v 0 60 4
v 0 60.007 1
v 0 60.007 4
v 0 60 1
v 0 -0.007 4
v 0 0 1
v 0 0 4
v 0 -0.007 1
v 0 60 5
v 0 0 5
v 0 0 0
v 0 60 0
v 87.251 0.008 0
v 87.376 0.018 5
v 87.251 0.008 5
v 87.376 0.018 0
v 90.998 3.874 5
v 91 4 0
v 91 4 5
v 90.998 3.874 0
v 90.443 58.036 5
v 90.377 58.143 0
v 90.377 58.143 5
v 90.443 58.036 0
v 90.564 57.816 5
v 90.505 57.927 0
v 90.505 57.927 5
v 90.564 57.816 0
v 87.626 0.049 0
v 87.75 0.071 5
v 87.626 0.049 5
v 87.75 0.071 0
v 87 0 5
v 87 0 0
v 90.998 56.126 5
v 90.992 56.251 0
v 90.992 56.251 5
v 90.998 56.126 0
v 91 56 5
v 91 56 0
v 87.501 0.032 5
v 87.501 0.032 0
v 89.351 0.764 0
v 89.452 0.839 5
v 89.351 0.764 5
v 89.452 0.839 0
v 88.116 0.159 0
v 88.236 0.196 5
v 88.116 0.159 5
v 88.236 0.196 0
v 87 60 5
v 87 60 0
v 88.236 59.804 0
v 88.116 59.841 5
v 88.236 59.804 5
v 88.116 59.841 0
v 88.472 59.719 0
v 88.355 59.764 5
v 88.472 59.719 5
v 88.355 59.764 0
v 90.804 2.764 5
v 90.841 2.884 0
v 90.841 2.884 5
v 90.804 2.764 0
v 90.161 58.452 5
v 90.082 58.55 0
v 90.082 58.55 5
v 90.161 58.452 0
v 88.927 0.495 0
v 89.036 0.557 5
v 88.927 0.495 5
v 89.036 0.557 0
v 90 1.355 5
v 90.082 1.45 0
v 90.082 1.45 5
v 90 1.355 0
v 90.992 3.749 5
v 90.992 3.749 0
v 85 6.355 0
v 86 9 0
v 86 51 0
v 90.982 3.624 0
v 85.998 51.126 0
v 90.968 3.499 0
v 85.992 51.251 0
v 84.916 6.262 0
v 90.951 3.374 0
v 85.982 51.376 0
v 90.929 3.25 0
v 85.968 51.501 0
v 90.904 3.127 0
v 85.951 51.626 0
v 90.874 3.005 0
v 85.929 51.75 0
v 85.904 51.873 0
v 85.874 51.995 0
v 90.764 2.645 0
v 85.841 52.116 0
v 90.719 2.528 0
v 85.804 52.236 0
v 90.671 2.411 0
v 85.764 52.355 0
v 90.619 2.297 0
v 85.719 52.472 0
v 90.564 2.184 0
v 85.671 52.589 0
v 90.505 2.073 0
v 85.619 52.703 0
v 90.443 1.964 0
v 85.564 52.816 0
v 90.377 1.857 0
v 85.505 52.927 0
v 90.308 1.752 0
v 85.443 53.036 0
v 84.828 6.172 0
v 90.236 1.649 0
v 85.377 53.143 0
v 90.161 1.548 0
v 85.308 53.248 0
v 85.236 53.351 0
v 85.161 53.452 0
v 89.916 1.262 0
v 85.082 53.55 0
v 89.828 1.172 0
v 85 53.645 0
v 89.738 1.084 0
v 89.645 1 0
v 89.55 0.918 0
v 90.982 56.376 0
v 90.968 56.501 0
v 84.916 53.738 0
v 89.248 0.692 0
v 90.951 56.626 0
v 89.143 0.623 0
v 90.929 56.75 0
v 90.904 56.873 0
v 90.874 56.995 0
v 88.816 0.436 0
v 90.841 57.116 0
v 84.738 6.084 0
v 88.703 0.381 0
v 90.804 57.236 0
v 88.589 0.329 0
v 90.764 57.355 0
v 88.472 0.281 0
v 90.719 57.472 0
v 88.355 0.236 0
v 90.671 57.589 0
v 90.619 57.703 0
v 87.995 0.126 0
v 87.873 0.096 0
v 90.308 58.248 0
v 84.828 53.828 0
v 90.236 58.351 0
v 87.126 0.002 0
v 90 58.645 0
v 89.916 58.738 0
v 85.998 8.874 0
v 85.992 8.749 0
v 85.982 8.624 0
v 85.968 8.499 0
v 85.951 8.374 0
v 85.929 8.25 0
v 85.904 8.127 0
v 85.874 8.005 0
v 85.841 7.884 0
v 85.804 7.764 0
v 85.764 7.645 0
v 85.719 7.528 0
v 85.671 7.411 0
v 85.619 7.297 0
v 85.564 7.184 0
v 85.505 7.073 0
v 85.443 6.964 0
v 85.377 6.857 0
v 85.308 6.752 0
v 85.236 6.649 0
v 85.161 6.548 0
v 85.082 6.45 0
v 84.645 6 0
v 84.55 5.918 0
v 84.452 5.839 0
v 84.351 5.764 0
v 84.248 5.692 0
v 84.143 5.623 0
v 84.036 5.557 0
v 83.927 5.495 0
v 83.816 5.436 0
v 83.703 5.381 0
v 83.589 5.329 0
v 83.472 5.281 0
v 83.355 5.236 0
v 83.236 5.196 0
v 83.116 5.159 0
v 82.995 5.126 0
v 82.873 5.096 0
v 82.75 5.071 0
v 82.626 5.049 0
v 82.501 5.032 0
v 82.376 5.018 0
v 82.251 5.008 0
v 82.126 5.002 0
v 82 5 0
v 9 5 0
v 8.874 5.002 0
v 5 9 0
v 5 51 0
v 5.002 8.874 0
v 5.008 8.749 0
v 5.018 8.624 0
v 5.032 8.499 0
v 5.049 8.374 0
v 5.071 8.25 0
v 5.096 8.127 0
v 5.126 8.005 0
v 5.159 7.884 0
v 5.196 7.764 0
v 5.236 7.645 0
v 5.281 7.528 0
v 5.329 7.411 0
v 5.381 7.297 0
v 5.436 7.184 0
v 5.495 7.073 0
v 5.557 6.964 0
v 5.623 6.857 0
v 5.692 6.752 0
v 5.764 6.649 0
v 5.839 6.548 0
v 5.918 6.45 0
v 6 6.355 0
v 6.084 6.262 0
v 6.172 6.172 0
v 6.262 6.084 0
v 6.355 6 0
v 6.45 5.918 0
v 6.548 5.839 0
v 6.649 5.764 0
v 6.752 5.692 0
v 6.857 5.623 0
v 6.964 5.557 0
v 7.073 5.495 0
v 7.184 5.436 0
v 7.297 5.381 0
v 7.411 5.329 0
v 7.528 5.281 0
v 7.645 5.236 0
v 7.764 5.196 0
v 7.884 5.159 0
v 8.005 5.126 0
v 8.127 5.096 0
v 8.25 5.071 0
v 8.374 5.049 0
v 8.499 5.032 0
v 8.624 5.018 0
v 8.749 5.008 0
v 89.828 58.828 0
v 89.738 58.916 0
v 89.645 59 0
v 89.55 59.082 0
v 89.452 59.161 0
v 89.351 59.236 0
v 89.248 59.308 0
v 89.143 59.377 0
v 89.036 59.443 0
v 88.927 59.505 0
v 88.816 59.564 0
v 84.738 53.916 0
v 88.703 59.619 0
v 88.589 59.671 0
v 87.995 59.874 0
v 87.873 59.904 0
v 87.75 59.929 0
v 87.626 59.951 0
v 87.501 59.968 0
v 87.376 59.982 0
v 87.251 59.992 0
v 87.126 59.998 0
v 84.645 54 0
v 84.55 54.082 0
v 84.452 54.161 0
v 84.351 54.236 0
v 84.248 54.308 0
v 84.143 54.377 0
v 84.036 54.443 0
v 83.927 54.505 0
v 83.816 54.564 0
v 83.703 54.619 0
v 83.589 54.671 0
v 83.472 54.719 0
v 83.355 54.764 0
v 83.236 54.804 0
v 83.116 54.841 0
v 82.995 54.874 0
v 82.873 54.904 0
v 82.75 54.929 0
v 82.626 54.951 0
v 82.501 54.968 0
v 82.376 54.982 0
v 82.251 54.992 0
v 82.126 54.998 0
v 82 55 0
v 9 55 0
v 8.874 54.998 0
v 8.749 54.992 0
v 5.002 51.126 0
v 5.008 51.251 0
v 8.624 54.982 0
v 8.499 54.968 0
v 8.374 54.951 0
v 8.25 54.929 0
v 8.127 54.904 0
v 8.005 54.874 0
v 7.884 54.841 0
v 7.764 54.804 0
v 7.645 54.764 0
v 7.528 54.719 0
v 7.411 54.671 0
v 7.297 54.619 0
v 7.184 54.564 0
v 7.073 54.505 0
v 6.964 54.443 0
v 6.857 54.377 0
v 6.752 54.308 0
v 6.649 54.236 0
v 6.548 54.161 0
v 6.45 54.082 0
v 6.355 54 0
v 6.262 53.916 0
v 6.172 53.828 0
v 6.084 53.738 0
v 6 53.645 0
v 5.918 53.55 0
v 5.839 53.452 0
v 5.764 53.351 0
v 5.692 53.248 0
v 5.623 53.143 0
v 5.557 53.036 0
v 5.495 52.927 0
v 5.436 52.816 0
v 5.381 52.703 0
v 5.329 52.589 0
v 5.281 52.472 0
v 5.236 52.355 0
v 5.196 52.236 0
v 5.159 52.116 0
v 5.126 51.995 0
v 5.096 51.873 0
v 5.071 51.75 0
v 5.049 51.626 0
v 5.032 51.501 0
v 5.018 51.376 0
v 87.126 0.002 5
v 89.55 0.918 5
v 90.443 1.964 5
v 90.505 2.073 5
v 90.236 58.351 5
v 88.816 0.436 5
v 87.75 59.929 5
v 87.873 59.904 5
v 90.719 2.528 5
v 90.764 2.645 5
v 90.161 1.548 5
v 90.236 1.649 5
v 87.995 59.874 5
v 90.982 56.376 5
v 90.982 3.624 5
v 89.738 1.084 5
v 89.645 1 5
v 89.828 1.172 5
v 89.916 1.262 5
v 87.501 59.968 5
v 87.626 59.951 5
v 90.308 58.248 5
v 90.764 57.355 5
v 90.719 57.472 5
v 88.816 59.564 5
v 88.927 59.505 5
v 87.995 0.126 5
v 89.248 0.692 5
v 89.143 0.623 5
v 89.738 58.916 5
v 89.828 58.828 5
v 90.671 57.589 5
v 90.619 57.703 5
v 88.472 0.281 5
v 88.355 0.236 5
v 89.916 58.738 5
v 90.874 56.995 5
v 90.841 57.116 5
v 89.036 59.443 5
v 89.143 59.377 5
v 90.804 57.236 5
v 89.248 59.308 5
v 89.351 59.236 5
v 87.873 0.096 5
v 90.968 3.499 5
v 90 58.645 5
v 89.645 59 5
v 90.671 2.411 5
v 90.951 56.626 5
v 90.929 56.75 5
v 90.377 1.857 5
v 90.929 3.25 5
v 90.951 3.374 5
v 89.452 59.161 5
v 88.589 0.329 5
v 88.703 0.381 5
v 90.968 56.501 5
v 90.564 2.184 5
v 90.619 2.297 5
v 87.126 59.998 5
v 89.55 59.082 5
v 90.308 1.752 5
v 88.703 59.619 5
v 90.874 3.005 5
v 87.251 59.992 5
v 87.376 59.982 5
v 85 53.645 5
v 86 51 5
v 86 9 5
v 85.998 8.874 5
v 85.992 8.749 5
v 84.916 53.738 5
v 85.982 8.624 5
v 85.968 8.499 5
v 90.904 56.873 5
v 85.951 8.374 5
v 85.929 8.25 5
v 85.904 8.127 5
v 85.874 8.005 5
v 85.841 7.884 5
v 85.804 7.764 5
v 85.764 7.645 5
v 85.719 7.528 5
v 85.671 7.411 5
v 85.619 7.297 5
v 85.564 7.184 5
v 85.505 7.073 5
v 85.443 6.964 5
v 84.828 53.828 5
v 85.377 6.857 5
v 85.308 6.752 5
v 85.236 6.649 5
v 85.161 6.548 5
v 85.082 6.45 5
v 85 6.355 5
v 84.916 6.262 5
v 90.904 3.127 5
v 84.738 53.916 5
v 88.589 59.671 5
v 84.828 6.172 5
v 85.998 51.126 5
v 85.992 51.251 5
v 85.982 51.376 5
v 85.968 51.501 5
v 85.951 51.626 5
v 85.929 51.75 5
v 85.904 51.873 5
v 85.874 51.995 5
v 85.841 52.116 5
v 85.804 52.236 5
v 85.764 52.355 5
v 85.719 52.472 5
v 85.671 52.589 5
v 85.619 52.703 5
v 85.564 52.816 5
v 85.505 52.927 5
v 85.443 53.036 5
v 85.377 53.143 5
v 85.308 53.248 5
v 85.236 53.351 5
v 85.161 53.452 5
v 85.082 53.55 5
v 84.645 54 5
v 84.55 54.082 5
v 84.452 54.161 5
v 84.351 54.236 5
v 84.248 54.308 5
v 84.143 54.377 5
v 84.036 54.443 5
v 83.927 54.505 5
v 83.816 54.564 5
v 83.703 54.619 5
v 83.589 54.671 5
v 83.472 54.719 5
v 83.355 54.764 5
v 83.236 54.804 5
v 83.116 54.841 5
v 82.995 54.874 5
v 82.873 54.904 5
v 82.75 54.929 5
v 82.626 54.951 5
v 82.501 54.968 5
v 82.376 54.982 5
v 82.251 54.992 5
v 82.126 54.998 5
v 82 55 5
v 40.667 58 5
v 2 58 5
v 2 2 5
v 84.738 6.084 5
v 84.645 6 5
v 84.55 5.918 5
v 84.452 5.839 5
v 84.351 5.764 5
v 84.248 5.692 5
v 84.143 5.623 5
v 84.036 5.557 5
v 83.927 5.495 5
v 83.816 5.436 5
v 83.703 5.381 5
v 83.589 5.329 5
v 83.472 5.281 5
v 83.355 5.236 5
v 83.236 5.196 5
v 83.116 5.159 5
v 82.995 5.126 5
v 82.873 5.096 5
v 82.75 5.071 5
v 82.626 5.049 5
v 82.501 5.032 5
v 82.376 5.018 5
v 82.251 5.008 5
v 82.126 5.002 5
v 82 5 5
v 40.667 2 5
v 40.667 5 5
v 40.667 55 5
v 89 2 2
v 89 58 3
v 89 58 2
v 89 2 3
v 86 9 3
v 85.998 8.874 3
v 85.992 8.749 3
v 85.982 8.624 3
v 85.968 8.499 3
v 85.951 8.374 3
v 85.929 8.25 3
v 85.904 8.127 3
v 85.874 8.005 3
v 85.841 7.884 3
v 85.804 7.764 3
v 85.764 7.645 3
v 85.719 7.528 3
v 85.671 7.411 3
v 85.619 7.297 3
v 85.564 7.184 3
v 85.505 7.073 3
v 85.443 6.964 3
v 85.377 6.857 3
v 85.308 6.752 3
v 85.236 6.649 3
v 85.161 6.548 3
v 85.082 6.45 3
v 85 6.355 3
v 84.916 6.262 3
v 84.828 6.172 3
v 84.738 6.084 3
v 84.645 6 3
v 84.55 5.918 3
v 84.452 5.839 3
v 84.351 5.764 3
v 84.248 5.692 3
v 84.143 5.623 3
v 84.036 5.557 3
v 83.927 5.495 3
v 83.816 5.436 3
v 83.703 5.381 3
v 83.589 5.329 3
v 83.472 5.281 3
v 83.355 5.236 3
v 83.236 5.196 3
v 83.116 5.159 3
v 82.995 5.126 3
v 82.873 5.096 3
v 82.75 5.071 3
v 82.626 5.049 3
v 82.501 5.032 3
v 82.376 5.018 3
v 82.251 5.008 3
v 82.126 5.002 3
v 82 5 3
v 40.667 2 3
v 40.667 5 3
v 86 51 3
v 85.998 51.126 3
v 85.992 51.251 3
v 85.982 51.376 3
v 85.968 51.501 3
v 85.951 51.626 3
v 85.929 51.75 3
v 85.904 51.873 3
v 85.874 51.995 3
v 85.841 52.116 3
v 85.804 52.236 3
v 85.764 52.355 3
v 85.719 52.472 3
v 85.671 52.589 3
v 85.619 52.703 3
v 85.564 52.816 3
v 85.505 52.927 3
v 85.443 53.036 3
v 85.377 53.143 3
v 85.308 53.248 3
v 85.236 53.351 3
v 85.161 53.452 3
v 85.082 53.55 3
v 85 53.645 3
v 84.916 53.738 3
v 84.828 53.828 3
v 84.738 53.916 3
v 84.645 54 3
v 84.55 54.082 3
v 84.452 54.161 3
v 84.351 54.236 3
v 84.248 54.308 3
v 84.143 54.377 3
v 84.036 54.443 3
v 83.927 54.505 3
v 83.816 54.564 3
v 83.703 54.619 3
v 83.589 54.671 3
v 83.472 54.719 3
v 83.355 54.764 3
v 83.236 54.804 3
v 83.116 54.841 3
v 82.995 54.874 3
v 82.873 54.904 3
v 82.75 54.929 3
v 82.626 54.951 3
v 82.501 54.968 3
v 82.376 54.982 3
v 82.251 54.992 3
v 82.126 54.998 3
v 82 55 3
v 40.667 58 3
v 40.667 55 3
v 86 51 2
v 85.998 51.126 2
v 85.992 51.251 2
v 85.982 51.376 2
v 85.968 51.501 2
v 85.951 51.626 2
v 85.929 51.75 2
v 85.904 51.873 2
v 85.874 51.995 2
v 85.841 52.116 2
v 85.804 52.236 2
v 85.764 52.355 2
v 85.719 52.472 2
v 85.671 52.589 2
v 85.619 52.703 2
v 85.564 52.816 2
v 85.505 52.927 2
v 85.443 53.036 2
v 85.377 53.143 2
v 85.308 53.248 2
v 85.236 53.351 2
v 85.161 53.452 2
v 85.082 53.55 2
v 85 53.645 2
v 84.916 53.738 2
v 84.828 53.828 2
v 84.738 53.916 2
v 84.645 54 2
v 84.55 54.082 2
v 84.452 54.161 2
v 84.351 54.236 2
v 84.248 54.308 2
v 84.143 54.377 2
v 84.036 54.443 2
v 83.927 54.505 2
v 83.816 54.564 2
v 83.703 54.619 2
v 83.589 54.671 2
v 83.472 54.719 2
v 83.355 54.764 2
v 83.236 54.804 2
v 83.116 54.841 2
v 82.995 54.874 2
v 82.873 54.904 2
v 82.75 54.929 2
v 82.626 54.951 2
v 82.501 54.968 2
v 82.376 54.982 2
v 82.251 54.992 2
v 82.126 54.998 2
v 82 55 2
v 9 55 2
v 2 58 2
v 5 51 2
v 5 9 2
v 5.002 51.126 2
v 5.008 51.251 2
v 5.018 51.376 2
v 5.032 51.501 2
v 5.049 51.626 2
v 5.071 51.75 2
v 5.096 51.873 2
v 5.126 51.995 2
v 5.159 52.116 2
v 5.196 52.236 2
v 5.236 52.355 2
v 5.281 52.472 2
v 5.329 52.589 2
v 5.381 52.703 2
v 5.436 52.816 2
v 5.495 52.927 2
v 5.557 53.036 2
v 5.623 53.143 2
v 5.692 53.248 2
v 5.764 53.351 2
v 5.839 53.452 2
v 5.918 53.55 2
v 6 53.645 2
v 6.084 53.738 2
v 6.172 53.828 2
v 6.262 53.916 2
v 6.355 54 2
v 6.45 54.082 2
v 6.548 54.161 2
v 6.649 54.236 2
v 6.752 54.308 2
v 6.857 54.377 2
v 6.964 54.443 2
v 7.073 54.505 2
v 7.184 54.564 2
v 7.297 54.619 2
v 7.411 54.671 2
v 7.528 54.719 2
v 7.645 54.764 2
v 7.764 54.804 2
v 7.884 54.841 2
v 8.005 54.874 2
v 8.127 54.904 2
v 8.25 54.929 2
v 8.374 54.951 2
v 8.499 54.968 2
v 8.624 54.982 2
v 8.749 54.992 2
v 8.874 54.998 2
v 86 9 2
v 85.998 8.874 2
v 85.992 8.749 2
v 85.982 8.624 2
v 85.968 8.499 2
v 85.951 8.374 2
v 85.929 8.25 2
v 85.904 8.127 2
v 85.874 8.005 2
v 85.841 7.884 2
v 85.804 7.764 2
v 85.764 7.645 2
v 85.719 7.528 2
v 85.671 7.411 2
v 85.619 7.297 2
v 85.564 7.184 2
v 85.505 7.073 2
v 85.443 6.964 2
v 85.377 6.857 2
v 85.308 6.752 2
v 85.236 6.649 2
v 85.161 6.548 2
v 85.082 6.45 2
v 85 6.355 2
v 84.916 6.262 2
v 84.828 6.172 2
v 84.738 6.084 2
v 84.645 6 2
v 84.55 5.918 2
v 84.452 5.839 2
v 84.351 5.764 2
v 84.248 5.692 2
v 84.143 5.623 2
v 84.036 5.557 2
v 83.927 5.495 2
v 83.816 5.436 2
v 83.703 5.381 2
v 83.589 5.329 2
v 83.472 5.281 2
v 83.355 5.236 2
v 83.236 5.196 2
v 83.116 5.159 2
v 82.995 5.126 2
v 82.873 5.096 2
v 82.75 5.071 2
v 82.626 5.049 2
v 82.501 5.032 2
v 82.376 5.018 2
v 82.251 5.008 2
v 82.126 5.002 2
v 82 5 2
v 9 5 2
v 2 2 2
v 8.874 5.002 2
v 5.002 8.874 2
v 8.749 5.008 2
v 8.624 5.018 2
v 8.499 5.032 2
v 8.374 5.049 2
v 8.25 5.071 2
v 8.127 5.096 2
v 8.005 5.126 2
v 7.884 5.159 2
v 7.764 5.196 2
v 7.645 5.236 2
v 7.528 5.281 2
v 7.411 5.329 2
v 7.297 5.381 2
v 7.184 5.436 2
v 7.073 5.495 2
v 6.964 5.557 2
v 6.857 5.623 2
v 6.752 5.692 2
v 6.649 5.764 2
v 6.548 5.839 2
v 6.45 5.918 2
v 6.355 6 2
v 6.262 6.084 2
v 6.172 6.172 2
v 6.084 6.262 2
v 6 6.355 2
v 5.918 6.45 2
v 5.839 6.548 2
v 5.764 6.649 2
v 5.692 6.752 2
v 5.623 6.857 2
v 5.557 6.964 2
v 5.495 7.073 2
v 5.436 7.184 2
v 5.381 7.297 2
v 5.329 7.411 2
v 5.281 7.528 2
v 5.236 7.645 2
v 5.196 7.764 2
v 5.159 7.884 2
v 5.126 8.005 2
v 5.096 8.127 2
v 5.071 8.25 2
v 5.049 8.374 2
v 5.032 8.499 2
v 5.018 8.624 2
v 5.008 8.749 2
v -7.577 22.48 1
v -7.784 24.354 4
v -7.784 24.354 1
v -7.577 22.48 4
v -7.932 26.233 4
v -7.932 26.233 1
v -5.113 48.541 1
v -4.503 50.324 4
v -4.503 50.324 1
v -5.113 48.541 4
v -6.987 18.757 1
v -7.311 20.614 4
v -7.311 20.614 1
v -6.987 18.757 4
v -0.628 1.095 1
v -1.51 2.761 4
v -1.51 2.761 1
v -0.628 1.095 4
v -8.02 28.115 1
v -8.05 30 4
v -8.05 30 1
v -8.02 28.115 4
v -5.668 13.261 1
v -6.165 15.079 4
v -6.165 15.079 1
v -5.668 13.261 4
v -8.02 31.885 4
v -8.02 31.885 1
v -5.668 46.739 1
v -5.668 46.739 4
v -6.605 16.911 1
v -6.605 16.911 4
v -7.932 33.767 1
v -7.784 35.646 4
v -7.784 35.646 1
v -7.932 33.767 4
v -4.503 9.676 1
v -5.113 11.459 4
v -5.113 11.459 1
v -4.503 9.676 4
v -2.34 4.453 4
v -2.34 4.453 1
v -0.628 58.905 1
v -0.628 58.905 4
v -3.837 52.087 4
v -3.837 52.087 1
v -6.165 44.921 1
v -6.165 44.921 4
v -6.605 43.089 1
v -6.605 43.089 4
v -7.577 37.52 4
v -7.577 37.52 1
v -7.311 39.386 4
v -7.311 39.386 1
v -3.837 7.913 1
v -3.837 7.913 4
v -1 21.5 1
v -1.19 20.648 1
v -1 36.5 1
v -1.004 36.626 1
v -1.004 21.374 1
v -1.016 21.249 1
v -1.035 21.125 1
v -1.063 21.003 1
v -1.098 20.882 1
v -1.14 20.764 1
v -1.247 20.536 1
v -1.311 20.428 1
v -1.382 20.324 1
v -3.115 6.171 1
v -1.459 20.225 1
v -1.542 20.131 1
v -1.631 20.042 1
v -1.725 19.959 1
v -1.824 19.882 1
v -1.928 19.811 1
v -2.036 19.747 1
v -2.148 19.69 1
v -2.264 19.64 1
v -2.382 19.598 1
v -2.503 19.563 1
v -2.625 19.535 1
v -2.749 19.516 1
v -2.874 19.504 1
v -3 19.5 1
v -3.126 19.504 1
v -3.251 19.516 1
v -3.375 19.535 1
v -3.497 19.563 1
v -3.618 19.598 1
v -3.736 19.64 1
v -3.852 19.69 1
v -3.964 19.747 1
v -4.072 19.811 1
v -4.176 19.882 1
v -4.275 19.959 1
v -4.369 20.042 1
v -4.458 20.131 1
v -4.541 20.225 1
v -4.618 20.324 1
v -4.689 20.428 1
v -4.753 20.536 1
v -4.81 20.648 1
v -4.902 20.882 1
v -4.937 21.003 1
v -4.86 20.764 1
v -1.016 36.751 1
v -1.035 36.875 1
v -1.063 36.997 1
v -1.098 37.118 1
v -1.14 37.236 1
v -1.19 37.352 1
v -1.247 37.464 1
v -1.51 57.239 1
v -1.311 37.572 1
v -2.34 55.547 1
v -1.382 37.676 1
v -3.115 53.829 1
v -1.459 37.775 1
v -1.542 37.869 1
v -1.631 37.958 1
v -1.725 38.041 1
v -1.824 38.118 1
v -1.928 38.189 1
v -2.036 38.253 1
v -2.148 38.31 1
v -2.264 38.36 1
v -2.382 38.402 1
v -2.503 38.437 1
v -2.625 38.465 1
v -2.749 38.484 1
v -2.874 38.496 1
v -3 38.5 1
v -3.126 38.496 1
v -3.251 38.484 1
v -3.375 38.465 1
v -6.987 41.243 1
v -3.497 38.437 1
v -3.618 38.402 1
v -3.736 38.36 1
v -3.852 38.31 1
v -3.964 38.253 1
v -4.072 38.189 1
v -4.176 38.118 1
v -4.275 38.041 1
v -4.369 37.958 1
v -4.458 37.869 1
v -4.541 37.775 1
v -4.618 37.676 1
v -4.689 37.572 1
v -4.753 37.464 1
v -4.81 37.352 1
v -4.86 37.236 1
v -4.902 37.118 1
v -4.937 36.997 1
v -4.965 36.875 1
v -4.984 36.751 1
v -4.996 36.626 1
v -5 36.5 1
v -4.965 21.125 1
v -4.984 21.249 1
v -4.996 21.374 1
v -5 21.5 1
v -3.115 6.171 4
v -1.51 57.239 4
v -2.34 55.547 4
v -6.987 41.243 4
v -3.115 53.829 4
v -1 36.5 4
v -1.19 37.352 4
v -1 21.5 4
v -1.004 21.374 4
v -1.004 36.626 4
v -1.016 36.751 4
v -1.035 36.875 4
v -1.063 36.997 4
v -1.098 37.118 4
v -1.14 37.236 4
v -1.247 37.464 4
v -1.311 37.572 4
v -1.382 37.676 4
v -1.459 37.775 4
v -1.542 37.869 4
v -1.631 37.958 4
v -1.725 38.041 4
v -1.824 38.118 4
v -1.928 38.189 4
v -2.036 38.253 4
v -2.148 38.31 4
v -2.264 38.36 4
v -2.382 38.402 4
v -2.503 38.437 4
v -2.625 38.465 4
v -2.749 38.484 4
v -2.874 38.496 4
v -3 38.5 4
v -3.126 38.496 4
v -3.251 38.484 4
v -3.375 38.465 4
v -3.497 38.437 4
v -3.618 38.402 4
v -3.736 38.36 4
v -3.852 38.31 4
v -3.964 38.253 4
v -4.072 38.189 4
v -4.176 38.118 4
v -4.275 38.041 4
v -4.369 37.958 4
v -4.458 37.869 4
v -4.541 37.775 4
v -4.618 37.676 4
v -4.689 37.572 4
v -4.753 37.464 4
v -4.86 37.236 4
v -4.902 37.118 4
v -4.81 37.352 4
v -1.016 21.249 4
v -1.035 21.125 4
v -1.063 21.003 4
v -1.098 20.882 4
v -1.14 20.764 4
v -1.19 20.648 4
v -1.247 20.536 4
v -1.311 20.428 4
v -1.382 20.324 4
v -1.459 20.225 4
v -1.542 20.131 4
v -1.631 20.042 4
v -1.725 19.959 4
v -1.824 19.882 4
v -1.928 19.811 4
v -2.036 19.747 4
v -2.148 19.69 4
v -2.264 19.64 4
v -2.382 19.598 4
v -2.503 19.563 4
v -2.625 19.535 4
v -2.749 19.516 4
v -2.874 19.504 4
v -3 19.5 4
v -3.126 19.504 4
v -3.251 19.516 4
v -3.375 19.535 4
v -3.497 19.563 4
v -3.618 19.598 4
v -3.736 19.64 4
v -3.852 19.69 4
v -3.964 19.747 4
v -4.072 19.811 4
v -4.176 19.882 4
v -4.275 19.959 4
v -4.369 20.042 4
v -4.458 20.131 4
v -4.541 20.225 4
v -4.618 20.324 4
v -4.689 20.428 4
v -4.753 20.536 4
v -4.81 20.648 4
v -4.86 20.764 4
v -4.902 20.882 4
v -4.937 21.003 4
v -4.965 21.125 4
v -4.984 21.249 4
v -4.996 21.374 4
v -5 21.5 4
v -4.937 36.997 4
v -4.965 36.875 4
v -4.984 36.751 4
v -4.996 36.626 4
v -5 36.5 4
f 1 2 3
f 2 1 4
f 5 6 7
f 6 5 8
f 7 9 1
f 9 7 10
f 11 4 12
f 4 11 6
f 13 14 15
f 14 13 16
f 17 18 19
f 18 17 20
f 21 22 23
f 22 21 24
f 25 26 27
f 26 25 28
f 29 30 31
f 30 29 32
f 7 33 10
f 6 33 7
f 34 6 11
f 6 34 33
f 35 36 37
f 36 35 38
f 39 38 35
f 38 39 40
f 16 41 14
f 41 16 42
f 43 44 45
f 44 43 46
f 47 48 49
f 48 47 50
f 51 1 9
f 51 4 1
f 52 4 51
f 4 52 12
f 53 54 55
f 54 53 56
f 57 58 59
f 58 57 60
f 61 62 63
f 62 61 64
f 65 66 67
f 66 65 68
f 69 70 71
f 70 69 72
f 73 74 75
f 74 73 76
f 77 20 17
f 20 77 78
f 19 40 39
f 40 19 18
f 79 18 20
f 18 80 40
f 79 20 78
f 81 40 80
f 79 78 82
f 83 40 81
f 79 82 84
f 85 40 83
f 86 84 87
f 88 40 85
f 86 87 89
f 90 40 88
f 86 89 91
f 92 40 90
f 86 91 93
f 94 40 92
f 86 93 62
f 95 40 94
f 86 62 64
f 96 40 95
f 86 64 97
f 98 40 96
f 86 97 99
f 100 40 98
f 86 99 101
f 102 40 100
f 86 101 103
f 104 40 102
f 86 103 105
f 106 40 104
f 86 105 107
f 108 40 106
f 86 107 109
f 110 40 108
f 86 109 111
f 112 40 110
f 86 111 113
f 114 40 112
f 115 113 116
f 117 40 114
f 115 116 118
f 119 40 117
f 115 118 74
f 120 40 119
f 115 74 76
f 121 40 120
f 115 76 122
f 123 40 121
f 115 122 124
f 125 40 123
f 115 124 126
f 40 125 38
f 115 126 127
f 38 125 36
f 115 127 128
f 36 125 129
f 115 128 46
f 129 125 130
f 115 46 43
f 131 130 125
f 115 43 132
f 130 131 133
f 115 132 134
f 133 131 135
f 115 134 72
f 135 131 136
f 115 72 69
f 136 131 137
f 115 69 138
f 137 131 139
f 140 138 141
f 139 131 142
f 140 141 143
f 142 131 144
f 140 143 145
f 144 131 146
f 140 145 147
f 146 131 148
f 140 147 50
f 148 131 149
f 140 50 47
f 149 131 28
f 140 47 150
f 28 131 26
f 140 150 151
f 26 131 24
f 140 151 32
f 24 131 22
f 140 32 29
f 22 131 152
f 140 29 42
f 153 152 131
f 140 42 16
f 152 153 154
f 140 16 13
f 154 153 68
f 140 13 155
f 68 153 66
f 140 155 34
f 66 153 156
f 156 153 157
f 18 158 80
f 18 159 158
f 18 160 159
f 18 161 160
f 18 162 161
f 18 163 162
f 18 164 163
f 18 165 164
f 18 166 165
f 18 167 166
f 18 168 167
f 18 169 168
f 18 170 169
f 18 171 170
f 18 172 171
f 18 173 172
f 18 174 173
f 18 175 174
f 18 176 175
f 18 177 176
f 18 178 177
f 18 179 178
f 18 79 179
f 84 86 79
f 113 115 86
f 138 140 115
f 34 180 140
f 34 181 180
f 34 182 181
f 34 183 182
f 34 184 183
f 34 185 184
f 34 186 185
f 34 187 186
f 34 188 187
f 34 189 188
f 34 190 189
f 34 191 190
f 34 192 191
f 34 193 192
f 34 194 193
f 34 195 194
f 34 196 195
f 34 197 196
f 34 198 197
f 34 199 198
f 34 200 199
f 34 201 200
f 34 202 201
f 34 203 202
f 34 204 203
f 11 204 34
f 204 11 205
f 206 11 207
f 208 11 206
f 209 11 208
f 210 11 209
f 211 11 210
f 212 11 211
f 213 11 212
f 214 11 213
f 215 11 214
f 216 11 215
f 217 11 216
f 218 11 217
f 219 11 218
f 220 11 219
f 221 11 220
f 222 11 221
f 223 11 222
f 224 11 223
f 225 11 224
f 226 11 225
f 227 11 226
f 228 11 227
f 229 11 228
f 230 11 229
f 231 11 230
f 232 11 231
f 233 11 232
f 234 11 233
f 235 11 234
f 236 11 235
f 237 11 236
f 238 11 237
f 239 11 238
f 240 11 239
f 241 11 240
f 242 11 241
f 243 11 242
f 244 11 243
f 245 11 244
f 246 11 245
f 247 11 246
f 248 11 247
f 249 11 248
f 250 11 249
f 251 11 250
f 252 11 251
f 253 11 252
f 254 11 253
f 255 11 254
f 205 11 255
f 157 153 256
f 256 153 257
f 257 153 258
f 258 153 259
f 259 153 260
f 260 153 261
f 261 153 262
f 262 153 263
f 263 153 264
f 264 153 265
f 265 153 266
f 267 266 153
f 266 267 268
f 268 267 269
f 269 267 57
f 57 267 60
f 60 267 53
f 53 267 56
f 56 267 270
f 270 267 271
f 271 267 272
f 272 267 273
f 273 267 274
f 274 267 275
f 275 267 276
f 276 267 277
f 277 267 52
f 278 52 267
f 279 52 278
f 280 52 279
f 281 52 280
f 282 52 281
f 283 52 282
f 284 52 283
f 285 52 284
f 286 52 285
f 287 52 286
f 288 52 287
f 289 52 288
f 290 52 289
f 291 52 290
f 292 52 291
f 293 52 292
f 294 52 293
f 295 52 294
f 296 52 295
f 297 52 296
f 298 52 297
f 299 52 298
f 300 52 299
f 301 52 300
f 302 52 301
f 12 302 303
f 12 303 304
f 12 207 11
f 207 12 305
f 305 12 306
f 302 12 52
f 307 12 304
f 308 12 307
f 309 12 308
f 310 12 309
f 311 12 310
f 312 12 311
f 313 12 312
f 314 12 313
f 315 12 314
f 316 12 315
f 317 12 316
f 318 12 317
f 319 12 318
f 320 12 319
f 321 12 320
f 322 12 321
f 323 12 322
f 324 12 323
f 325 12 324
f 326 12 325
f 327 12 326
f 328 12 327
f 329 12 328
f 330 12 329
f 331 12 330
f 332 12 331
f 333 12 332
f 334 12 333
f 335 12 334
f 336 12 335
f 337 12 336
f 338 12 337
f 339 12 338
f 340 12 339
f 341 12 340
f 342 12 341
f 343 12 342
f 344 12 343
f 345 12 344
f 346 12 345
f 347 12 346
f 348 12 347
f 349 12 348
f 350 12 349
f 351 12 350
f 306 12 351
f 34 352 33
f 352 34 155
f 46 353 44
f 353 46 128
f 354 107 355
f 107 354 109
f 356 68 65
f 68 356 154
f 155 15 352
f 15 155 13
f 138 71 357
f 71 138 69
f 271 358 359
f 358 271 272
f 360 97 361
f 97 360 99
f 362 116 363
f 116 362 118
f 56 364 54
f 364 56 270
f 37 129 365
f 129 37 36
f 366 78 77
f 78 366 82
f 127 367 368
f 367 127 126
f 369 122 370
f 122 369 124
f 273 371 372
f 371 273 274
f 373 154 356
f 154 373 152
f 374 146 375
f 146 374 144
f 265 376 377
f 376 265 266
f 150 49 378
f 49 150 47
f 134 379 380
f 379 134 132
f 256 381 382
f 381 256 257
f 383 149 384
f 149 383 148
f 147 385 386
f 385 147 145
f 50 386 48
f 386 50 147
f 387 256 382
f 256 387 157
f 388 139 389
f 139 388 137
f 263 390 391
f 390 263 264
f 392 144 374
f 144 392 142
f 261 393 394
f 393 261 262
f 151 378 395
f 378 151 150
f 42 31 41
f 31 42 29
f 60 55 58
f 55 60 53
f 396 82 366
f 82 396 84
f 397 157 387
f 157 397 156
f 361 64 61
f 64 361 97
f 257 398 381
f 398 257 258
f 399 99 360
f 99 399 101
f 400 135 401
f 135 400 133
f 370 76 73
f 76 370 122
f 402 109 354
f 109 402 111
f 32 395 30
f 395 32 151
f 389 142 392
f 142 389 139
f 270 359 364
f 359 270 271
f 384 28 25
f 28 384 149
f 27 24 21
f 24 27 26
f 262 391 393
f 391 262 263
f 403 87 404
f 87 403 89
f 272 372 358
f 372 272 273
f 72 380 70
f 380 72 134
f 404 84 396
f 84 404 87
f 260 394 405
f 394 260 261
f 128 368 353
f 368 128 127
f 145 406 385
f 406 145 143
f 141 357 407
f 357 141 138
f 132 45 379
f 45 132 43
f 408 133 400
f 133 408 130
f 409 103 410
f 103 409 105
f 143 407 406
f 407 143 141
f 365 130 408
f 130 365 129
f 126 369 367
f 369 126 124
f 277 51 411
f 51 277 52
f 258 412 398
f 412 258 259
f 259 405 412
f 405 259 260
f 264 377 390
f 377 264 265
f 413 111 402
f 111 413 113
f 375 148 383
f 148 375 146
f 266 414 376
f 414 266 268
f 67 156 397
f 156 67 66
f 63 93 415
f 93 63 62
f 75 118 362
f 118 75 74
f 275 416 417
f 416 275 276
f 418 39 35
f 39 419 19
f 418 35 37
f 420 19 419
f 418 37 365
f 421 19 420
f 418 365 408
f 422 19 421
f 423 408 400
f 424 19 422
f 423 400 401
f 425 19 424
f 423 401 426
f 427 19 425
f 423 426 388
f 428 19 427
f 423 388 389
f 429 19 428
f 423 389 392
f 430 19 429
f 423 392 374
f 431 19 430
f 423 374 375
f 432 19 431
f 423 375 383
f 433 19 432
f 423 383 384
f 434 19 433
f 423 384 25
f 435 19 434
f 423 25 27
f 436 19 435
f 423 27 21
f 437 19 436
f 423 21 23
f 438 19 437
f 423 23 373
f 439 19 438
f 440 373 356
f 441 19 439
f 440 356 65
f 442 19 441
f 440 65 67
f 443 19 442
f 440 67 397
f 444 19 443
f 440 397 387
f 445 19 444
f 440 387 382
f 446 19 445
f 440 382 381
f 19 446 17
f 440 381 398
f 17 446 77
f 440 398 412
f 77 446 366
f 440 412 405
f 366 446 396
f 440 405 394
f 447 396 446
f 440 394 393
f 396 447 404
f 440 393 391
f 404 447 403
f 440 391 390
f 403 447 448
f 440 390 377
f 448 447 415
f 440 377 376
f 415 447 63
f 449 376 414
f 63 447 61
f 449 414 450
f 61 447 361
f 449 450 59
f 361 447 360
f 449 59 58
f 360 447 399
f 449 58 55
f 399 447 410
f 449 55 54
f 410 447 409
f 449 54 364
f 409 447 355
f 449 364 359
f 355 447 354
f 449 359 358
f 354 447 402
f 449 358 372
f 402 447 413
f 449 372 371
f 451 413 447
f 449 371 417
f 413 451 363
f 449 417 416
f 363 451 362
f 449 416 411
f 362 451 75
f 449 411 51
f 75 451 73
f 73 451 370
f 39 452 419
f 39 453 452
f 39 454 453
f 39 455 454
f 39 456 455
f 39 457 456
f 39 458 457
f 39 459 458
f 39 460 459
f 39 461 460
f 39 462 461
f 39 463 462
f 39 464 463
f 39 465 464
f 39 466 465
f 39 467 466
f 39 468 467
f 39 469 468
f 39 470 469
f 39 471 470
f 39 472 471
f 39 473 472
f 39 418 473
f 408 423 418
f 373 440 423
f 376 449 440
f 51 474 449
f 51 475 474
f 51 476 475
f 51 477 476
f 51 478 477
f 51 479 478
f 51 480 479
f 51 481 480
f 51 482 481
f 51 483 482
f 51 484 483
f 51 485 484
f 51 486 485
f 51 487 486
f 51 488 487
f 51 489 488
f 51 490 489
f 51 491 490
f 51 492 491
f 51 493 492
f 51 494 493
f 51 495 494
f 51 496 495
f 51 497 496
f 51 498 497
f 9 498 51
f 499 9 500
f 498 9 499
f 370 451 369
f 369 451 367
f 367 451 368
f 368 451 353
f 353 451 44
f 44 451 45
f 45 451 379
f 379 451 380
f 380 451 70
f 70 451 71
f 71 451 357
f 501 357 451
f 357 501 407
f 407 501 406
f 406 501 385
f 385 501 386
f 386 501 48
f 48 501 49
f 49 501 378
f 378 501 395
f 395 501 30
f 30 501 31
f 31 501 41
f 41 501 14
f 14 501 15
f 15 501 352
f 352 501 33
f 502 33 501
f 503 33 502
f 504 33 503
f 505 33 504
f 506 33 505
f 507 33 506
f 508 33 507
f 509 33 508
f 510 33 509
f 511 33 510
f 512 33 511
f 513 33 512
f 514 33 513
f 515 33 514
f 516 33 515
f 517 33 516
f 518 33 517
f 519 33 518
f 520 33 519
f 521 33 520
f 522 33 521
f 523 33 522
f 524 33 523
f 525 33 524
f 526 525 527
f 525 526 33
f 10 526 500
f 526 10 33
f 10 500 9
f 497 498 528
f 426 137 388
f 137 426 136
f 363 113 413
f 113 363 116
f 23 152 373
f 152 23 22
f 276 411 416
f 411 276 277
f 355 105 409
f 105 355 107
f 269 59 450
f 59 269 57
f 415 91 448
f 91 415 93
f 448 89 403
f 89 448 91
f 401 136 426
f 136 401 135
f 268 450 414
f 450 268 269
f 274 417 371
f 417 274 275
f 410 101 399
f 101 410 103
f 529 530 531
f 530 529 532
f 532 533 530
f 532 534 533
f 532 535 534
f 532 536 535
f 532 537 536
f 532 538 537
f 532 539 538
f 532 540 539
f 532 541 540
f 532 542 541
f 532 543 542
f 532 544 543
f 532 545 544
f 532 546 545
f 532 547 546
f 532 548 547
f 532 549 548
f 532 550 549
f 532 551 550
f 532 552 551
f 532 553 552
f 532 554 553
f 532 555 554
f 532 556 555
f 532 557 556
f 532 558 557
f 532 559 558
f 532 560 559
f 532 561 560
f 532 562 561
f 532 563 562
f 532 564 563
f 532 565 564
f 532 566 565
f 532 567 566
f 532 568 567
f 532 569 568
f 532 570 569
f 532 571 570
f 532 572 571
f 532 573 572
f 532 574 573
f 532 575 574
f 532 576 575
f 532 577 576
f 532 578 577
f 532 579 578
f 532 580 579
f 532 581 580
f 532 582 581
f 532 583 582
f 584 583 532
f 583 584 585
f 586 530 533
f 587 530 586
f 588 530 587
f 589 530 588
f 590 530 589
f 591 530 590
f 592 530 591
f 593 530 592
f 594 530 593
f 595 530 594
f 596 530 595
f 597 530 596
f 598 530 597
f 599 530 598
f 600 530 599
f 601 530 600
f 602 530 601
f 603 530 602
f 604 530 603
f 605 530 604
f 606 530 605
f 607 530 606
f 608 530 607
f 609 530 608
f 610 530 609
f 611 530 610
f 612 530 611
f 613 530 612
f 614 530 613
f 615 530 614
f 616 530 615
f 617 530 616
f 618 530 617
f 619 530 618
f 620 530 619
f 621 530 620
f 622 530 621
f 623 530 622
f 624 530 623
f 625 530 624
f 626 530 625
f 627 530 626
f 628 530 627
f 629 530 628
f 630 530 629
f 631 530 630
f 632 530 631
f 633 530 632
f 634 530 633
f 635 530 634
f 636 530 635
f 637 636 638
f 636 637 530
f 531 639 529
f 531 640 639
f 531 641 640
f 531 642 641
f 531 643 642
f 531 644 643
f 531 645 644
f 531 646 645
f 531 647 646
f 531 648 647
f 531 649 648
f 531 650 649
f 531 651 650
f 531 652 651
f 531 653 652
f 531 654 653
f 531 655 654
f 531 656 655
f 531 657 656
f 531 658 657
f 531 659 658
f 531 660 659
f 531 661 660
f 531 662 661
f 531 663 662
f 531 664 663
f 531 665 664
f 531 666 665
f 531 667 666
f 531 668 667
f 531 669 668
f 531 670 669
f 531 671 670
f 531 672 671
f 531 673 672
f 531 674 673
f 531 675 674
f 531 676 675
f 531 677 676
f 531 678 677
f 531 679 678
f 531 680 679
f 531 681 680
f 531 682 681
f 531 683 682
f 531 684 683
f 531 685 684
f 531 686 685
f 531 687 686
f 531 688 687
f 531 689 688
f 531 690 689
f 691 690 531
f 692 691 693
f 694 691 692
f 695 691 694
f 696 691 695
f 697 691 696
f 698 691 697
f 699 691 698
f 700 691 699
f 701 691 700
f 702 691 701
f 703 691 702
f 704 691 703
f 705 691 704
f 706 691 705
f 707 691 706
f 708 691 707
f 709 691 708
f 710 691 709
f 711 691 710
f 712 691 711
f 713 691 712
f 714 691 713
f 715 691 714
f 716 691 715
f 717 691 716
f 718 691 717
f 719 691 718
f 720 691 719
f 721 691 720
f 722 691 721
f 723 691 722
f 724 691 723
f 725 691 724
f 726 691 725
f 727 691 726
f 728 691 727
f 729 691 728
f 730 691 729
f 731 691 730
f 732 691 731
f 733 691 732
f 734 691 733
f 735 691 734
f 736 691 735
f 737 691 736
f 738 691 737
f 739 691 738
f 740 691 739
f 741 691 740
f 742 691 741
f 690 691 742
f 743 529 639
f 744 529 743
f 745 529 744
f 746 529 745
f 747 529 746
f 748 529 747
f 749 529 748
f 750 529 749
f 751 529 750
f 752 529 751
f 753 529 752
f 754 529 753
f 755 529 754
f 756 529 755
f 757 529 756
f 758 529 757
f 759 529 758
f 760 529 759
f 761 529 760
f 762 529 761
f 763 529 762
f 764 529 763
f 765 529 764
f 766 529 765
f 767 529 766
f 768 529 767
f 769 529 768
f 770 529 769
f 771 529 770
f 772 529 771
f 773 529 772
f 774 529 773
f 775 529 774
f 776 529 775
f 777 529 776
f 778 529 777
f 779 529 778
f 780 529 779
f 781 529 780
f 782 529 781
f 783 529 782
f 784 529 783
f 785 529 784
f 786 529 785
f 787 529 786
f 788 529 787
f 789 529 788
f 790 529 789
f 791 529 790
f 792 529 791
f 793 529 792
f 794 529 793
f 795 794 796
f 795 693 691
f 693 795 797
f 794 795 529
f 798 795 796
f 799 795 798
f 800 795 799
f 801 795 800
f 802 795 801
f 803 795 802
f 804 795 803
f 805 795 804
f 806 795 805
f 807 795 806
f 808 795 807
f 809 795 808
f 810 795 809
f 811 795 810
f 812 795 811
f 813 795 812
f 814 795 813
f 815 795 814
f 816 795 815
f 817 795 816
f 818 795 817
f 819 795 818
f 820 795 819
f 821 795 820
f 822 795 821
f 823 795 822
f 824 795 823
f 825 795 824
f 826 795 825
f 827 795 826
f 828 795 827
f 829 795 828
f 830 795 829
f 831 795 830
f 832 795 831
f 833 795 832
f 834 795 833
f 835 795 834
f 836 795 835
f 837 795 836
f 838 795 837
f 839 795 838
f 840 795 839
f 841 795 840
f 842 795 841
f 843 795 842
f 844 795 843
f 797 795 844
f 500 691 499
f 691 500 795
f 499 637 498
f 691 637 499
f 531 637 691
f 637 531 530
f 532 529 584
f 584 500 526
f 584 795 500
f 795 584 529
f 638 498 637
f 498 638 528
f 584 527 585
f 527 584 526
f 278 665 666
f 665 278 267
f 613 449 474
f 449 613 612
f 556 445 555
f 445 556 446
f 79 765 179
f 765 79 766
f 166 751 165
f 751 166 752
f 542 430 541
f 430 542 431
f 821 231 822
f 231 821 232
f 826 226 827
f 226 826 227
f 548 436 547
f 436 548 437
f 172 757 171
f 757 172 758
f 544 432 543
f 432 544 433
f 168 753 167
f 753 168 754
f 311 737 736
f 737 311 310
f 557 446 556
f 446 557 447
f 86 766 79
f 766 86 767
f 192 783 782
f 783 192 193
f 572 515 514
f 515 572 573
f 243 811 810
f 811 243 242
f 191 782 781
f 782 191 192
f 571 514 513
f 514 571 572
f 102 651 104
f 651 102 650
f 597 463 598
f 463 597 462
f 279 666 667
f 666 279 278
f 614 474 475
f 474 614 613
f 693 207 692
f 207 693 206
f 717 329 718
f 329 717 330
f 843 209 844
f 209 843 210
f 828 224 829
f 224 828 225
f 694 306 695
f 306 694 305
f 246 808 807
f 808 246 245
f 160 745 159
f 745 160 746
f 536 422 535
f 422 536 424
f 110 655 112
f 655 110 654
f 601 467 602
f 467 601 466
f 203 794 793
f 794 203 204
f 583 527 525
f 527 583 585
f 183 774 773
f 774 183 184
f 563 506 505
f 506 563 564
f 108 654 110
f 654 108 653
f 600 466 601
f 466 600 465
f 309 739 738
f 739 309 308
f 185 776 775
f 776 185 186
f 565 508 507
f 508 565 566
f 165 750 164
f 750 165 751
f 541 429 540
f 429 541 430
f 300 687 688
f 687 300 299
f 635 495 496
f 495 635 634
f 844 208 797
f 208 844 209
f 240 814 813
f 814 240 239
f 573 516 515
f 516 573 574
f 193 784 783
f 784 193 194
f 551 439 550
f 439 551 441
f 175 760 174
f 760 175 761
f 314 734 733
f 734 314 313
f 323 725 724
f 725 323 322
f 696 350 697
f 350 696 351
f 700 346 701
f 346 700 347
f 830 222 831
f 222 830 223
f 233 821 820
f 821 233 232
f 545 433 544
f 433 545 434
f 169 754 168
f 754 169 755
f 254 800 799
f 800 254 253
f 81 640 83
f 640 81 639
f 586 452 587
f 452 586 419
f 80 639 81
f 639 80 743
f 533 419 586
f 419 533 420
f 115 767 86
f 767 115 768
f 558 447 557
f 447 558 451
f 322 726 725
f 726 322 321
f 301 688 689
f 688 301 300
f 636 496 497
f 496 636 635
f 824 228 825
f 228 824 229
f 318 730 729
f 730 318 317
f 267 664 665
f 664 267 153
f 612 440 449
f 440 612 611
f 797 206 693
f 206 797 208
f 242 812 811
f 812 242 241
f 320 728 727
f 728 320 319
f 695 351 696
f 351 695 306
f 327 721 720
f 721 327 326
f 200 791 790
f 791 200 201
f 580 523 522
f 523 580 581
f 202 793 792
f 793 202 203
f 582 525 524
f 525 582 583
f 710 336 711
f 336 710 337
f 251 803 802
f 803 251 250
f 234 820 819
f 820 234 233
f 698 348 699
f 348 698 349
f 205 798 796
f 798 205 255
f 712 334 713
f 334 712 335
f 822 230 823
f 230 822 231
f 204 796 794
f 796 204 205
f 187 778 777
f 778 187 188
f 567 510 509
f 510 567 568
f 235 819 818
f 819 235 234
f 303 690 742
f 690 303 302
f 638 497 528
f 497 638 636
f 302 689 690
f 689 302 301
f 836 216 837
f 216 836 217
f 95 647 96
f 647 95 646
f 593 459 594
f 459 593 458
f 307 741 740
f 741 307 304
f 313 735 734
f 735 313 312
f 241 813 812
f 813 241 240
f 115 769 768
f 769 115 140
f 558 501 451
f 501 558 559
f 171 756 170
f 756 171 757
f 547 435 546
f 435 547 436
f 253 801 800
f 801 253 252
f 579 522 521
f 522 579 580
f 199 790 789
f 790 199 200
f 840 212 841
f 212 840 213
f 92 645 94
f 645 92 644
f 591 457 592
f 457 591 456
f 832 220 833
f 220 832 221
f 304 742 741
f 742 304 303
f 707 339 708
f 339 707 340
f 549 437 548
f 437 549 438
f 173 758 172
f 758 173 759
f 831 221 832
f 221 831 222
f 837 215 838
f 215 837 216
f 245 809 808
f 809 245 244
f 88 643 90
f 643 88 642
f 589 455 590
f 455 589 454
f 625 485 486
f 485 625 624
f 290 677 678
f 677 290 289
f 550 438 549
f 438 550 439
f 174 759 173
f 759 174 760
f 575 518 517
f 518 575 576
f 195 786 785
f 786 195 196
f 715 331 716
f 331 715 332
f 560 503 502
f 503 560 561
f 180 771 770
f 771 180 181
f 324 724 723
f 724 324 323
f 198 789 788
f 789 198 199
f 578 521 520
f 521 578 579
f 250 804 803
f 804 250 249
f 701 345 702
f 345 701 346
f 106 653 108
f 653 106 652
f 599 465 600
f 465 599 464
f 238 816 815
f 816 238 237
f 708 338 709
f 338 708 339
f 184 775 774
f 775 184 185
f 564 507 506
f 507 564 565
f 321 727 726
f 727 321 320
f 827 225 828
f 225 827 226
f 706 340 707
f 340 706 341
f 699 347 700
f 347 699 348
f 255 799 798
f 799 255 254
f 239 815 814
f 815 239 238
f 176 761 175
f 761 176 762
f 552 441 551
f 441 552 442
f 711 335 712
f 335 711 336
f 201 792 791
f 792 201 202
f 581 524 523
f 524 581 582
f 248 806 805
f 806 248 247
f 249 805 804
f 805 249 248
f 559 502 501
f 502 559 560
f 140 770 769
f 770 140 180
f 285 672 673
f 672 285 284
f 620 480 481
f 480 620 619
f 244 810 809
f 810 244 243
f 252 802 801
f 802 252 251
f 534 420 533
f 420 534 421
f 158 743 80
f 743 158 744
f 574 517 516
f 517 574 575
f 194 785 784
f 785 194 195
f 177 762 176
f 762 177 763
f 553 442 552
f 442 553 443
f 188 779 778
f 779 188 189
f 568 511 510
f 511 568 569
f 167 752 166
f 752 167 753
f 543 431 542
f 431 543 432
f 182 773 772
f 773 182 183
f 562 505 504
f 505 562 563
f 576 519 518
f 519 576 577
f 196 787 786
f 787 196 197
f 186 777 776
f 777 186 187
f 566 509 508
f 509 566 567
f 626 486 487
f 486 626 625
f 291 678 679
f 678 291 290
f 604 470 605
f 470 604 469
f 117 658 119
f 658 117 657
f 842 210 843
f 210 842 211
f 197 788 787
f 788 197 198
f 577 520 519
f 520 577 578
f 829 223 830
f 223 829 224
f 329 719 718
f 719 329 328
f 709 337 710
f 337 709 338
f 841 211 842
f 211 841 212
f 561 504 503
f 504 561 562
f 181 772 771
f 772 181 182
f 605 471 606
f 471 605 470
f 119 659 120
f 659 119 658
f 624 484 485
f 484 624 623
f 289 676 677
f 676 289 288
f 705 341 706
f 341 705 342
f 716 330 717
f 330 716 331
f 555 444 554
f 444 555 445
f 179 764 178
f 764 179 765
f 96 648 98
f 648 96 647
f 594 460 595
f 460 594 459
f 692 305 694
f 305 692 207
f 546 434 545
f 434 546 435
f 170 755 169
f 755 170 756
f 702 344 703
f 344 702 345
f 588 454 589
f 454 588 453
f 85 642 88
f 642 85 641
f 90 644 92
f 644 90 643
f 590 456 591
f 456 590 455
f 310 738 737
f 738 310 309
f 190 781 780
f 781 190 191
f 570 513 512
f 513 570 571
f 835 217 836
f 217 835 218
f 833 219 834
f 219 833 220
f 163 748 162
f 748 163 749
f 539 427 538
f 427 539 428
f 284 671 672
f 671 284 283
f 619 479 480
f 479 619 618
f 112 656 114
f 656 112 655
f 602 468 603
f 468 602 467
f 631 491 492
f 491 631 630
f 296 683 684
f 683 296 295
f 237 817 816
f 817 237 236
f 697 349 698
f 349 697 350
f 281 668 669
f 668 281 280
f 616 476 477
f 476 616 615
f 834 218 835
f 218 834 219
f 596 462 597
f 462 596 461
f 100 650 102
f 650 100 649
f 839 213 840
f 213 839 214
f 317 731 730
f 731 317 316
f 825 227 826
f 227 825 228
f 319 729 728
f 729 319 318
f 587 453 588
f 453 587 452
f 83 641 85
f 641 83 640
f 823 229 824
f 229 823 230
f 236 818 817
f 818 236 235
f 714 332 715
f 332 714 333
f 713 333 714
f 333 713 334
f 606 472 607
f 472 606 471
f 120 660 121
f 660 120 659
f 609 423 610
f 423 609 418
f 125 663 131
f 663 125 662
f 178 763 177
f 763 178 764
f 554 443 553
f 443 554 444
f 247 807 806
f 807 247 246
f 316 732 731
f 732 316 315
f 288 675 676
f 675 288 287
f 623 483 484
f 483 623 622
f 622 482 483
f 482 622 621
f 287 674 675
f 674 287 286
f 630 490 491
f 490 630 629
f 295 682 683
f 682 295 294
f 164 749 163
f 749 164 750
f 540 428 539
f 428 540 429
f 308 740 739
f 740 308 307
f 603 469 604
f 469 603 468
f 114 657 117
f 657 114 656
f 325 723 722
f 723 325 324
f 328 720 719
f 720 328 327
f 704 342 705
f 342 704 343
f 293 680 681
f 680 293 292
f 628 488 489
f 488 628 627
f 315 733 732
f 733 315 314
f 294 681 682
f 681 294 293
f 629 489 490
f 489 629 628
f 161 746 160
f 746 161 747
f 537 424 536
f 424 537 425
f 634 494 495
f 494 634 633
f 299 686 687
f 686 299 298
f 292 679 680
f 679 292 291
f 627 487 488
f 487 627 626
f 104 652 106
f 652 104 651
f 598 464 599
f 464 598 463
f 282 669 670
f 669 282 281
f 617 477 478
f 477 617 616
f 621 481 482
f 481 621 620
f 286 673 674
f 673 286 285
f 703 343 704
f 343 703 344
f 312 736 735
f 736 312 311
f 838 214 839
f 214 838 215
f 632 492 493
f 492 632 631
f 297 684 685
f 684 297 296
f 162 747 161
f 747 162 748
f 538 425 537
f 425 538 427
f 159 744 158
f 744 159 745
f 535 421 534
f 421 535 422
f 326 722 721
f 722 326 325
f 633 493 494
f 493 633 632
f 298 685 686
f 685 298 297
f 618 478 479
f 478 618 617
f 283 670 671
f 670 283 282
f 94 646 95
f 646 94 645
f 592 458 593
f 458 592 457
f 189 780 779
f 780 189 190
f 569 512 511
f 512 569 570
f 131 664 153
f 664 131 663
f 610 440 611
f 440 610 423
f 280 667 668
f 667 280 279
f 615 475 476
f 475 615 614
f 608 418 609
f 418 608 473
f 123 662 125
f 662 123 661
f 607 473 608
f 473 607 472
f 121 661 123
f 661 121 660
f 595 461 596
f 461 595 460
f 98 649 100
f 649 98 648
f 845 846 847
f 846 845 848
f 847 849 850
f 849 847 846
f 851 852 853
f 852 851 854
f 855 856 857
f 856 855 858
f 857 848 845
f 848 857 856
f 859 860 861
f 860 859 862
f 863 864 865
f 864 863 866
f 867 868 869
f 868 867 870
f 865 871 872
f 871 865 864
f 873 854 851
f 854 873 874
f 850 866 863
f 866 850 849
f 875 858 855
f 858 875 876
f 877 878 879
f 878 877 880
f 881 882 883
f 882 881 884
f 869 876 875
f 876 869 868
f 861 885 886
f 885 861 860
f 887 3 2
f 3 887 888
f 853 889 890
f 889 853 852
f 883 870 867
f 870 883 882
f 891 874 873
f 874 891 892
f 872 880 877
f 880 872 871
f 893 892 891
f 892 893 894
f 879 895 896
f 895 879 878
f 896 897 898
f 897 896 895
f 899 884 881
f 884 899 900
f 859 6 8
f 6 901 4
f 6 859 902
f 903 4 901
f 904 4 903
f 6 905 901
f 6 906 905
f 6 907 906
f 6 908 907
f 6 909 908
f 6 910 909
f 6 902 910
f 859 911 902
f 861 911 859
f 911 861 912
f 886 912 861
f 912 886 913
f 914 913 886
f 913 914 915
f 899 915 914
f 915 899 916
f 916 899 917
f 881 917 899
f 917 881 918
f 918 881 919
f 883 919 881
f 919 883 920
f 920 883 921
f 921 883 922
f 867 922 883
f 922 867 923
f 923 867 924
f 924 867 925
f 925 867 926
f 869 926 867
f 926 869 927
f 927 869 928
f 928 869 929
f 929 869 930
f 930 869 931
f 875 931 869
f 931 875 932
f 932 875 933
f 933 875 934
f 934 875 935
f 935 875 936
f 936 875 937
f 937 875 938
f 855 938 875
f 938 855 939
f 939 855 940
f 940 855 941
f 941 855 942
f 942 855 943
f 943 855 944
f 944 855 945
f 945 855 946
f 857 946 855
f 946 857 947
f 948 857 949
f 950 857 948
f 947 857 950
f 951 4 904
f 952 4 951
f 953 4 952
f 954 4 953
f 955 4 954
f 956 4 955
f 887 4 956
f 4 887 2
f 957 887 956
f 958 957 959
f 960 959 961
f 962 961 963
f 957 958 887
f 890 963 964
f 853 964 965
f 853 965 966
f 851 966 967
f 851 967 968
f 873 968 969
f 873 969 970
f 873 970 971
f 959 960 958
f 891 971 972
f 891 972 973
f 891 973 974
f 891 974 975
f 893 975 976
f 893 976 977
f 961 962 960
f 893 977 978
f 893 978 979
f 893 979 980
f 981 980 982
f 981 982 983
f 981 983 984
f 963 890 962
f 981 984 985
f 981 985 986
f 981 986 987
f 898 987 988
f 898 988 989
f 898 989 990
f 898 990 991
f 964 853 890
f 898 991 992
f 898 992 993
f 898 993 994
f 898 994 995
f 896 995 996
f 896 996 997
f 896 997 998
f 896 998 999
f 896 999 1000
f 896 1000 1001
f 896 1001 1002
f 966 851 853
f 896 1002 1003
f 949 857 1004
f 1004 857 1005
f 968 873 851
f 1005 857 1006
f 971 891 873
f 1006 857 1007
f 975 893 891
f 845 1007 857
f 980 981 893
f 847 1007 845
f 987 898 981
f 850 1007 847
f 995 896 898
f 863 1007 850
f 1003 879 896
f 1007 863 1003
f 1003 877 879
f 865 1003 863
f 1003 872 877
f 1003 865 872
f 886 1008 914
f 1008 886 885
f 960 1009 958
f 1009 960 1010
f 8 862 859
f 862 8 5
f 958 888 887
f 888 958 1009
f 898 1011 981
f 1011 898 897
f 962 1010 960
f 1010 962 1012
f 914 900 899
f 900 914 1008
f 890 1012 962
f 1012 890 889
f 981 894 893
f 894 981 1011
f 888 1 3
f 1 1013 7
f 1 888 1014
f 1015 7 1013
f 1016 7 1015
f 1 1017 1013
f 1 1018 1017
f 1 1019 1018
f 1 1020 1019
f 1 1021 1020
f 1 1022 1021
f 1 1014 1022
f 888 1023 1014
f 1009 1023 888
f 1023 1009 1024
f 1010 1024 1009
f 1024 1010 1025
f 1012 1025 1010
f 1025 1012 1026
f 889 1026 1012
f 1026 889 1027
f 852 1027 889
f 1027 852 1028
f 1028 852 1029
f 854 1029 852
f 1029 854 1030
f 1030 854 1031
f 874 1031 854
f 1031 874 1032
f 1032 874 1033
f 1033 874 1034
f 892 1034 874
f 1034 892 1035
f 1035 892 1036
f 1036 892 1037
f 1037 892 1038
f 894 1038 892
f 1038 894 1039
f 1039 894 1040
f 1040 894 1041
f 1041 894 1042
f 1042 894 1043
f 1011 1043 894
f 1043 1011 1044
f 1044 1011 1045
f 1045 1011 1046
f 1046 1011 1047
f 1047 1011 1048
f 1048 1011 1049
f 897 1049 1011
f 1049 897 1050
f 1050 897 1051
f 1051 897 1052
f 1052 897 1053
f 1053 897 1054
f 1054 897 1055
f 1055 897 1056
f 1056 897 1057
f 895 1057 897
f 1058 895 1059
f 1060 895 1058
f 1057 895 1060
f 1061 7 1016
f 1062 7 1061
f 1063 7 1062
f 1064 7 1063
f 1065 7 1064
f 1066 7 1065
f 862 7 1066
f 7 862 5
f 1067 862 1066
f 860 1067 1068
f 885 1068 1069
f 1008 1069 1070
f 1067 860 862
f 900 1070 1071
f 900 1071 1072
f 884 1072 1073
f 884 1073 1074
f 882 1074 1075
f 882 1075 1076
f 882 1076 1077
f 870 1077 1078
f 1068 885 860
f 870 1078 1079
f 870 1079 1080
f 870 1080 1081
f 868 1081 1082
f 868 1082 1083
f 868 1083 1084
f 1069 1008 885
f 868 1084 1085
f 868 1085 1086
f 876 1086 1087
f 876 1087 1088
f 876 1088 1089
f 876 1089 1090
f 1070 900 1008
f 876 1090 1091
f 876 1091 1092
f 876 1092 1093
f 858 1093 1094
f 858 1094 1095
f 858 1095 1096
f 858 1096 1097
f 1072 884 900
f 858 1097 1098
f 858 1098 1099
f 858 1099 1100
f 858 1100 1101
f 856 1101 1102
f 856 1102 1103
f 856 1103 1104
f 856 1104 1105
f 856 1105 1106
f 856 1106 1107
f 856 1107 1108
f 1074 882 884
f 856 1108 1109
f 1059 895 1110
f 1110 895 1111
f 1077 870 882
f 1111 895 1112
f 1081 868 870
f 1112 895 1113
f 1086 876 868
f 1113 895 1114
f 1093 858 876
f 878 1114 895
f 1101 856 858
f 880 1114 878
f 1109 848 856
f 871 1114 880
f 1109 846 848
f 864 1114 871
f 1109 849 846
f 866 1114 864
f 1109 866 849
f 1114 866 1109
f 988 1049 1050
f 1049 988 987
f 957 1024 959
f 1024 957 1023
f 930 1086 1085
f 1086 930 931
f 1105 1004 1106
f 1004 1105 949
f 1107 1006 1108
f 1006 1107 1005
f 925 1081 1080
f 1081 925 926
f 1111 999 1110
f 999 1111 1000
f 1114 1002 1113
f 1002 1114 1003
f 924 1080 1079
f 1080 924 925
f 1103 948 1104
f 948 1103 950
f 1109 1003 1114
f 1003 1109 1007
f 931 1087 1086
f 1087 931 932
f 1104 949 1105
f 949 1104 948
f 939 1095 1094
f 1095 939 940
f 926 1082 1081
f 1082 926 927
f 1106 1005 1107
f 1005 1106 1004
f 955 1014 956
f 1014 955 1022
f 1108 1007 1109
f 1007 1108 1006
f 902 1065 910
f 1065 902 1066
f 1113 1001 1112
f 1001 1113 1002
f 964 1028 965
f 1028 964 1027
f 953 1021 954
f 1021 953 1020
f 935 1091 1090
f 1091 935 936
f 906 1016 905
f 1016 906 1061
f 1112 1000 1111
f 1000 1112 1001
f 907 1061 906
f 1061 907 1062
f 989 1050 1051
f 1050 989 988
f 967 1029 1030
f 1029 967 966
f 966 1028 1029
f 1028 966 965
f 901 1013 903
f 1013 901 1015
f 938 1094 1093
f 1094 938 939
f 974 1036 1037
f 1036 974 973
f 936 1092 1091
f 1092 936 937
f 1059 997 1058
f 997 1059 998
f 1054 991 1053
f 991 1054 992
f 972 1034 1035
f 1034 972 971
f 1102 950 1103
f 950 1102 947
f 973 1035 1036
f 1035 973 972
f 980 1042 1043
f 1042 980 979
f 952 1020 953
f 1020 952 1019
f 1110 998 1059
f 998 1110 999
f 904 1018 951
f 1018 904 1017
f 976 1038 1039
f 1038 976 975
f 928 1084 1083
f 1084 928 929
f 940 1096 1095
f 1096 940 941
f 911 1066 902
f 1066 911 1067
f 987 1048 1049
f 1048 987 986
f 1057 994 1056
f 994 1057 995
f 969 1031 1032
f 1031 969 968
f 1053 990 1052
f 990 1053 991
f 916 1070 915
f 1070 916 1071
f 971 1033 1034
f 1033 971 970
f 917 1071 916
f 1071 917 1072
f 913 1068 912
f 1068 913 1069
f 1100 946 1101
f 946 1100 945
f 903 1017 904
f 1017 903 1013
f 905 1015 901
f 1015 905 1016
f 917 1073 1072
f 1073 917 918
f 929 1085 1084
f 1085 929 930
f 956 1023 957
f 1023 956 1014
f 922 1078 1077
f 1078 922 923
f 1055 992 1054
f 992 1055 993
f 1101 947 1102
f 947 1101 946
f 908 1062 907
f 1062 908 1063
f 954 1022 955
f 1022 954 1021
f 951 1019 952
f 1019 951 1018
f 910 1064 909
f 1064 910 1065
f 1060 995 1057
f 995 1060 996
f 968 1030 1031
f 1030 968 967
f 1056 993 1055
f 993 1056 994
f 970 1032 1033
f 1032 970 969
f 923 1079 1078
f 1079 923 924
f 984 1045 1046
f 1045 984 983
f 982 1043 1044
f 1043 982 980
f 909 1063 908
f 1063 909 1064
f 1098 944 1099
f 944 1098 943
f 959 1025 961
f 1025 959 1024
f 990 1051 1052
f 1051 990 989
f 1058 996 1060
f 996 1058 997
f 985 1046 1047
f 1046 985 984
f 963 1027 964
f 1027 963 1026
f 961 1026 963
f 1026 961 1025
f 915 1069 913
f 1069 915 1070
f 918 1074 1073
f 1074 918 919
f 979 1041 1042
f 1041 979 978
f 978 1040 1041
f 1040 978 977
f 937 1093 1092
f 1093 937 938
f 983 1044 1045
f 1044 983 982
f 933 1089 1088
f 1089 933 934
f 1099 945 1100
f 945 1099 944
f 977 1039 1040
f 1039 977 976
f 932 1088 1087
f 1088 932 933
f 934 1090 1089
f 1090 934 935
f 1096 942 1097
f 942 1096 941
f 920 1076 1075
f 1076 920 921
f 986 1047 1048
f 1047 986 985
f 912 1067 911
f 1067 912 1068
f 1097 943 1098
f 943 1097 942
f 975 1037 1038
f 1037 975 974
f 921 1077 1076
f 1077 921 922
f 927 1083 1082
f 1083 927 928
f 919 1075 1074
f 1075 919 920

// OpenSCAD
badge_thickness = 1;
clip_tab_thickness = 3;

/* [Hidden] */
badge_width = 56;
badge_height = 87;

holder_wall_size = 2;
holder_bezel_size = holder_wall_size + 3;

holder_height = badge_height + (holder_wall_size * 2);
holder_width = badge_width + (holder_wall_size * 2);
holder_thickness = badge_thickness  + (holder_wall_size * 2);
holder_radius = 4;

clip_hole_width = 15;
clip_hole_height = 4;

difference() {
  hull() {
    cube(size=[holder_height - holder_radius, holder_width, holder_thickness]);
    
    translate([holder_height - holder_radius, holder_radius, 0])
      cylinder(h=holder_thickness, r=holder_radius, $fn=200);
    translate([holder_height - holder_radius, holder_width - holder_radius, 0])
      cylinder(h=holder_thickness, r=holder_radius, $fn=200);
  }
  
  translate([holder_wall_size,holder_wall_size, holder_wall_size])
    cube(size=[badge_height, badge_width, badge_thickness]);
  
  translate([holder_wall_size,holder_wall_size, holder_wall_size])
    cube(size=[badge_height / 2.25, badge_width, holder_thickness * 2]);
  
  hull() {
    translate([holder_bezel_size + holder_radius, holder_bezel_size + holder_radius, 0])
      cylinder(h=holder_thickness, r=holder_radius, $fn=200);
    translate([holder_bezel_size + holder_radius, holder_width - holder_bezel_size - holder_radius, 0])
      cylinder(h=holder_thickness, r=holder_radius, $fn=200);
    translate([holder_height - holder_bezel_size - holder_radius, holder_bezel_size + holder_radius, 0])
      cylinder(h=holder_thickness, r=holder_radius, $fn=200);
    translate([holder_height - holder_bezel_size - holder_radius, holder_width - holder_bezel_size - holder_radius, 0])
      cylinder(h=holder_thickness, r=holder_radius, $fn=200);
  }
}

difference() {
  translate([holder_width - 8.05, holder_width / 2, holder_thickness / 2 - clip_tab_thickness / 2])
    cylinder(h=clip_tab_thickness, d=holder_width * 2, $fn=200);
  
  translate([0, holder_width * -1.5, -1])
    cube(holder_width * 3, holder_width * 3, 100);
  
  translate([(clip_hole_height / -2) - 1, (holder_width - (clip_hole_width + (clip_hole_height / 2))) / 2, -.5])
  hull() {
    translate([0,clip_hole_width,0])
      cylinder(h=holder_thickness + 1, d=clip_hole_height, $fn=100);
    cylinder(h=holder_thickness + 1, d=clip_hole_height, $fn=100);
  }
}
